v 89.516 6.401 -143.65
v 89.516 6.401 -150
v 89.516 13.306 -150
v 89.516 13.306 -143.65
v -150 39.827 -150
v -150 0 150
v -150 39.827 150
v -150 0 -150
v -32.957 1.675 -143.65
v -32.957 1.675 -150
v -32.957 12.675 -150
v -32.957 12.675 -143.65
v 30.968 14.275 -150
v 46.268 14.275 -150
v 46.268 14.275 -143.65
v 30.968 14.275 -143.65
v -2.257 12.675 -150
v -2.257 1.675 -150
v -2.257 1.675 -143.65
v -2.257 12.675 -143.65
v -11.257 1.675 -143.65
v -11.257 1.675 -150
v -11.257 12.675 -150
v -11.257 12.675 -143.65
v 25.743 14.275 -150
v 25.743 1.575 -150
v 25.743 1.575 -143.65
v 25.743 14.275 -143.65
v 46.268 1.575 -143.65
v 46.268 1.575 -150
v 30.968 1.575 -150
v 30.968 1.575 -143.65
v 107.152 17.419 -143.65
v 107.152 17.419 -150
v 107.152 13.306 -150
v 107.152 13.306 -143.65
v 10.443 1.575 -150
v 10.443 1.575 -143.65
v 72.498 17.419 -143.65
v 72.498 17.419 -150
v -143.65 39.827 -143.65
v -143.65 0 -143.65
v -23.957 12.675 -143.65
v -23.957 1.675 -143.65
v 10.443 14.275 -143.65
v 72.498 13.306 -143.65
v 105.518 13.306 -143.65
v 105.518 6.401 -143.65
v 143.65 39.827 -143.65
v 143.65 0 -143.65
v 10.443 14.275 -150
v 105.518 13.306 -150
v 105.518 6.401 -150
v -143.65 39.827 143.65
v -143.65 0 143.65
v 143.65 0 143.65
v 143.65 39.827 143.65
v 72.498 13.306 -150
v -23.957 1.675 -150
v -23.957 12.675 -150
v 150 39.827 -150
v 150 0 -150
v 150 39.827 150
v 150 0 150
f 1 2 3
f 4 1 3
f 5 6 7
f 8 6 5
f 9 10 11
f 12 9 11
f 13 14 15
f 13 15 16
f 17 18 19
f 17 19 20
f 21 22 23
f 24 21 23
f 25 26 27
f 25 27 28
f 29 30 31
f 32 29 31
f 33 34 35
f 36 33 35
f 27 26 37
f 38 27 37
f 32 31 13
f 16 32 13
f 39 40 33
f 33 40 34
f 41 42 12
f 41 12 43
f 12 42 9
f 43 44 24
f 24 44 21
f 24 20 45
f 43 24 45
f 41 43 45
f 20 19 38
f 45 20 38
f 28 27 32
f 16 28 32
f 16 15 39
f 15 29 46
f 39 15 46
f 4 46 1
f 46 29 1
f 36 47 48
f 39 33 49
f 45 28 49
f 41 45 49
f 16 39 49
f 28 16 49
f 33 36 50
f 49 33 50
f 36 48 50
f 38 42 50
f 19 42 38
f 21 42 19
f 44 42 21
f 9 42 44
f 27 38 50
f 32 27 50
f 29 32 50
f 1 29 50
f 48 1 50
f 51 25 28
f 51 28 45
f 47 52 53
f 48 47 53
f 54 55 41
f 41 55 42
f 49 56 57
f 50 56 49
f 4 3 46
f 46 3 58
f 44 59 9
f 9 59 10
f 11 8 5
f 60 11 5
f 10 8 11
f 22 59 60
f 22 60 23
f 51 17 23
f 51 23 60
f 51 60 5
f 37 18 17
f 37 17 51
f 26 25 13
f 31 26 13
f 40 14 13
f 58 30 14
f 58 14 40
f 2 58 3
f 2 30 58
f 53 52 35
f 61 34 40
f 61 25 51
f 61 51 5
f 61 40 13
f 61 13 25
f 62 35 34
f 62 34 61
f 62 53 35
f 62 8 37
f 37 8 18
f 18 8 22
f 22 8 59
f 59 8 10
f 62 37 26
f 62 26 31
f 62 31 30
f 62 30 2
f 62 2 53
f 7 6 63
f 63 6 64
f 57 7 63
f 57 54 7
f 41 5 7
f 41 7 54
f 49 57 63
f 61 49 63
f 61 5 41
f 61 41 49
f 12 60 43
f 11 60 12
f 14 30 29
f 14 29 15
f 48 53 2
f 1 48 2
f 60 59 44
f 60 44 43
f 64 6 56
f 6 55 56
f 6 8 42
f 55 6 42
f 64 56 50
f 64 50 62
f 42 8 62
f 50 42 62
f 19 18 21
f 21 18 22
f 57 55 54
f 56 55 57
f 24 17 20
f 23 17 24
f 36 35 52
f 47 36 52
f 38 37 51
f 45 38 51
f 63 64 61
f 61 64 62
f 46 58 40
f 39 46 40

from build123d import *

# Parameters (mm, degrees)
SKETCH1_W           = 300
SKETCH1_H           = 300
SKETCH1_W_2         = 287.3
SKETCH1_H_2         = 287.3
BOSS_EXTRUDE1_DEPTH = 39.8272
CUT_EXTRUDE1_REACH  = 339.766
SKETCH3_W           = 15.3
SKETCH3_H           = 12.7
SKETCH3_W_2         = 9
SKETCH3_H_2         = 11


with BuildPart() as part:
    # Sketch1 → Boss-Extrude1 (new body)
    with BuildSketch(Plane(origin=(0, 0, 0), x_dir=(1, 0, 0), z_dir=(0, 1, 0))):
        Rectangle(SKETCH1_W, SKETCH1_H)
        Rectangle(SKETCH1_W_2, SKETCH1_H_2, mode=Mode.SUBTRACT)
    extrude(amount=BOSS_EXTRUDE1_DEPTH)

    # Sketch3 → Cut-Extrude1 (cut, up to next)
    with BuildSketch(Plane(origin=(0, 0, -150), x_dir=(-1, 0, 0), z_dir=(0, 0, -1)), mode=Mode.PRIVATE) as cut_extrude1_sk1:
        Polygon((-72.497624126, 13.305953258), (-72.497624126, 17.418810742), (-107.152019667, 17.418810742), (-107.152019667, 13.305953258), (-105.517624126, 13.305953258), (-105.517624126, 6.4008), (-89.515624126, 6.4008), (-89.515624126, 13.305953258), align=None)
    cut_extrude1_tool1 = extrude(cut_extrude1_sk1.sketch, amount=-CUT_EXTRUDE1_REACH, mode=Mode.PRIVATE) & part.part
    # Sketch3 → Cut-Extrude1 (cut, up to next)
    with BuildSketch(Plane(origin=(0, 0, -150), x_dir=(-1, 0, 0), z_dir=(0, 0, -1)), mode=Mode.PRIVATE) as cut_extrude1_sk2:
        with Locations((-38.618448478, 7.9248)):
            Rectangle(SKETCH3_W, SKETCH3_H)
    cut_extrude1_tool2 = extrude(cut_extrude1_sk2.sketch, amount=-CUT_EXTRUDE1_REACH, mode=Mode.PRIVATE) & part.part
    # Sketch3 → Cut-Extrude1 (cut, up to next)
    with BuildSketch(Plane(origin=(0, 0, -150), x_dir=(-1, 0, 0), z_dir=(0, 0, -1)), mode=Mode.PRIVATE) as cut_extrude1_sk3:
        with Locations((-18.092571078, 7.9248)):
            Rectangle(SKETCH3_W, SKETCH3_H)
    cut_extrude1_tool3 = extrude(cut_extrude1_sk3.sketch, amount=-CUT_EXTRUDE1_REACH, mode=Mode.PRIVATE) & part.part
    # Sketch3 → Cut-Extrude1 (cut, up to next)
    with BuildSketch(Plane(origin=(0, 0, -150), x_dir=(-1, 0, 0), z_dir=(0, 0, -1)), mode=Mode.PRIVATE) as cut_extrude1_sk4:
        with Locations((6.757428922, 7.1748)):
            Rectangle(SKETCH3_W_2, SKETCH3_H_2)
    cut_extrude1_tool4 = extrude(cut_extrude1_sk4.sketch, amount=-CUT_EXTRUDE1_REACH, mode=Mode.PRIVATE) & part.part
    # Sketch3 → Cut-Extrude1 (cut, up to next)
    with BuildSketch(Plane(origin=(0, 0, -150), x_dir=(-1, 0, 0), z_dir=(0, 0, -1)), mode=Mode.PRIVATE) as cut_extrude1_sk5:
        with Locations((28.457428922, 7.1748)):
            Rectangle(SKETCH3_W_2, SKETCH3_H_2)
    cut_extrude1_tool5 = extrude(cut_extrude1_sk5.sketch, amount=-CUT_EXTRUDE1_REACH, mode=Mode.PRIVATE) & part.part
    add(cut_extrude1_tool1.solids().sort_by_distance((93.183841, 12.956593, -150))[0], mode=Mode.SUBTRACT)
    add(cut_extrude1_tool2.solids().sort_by_distance((38.618448, 7.9248, -150))[0], mode=Mode.SUBTRACT)
    add(cut_extrude1_tool3.solids().sort_by_distance((18.092571, 7.9248, -150))[0], mode=Mode.SUBTRACT)
    add(cut_extrude1_tool4.solids().sort_by_distance((-6.757429, 7.1748, -150))[0], mode=Mode.SUBTRACT)
    add(cut_extrude1_tool5.solids().sort_by_distance((-28.457429, 7.1748, -150))[0], mode=Mode.SUBTRACT)


solid = part.part
